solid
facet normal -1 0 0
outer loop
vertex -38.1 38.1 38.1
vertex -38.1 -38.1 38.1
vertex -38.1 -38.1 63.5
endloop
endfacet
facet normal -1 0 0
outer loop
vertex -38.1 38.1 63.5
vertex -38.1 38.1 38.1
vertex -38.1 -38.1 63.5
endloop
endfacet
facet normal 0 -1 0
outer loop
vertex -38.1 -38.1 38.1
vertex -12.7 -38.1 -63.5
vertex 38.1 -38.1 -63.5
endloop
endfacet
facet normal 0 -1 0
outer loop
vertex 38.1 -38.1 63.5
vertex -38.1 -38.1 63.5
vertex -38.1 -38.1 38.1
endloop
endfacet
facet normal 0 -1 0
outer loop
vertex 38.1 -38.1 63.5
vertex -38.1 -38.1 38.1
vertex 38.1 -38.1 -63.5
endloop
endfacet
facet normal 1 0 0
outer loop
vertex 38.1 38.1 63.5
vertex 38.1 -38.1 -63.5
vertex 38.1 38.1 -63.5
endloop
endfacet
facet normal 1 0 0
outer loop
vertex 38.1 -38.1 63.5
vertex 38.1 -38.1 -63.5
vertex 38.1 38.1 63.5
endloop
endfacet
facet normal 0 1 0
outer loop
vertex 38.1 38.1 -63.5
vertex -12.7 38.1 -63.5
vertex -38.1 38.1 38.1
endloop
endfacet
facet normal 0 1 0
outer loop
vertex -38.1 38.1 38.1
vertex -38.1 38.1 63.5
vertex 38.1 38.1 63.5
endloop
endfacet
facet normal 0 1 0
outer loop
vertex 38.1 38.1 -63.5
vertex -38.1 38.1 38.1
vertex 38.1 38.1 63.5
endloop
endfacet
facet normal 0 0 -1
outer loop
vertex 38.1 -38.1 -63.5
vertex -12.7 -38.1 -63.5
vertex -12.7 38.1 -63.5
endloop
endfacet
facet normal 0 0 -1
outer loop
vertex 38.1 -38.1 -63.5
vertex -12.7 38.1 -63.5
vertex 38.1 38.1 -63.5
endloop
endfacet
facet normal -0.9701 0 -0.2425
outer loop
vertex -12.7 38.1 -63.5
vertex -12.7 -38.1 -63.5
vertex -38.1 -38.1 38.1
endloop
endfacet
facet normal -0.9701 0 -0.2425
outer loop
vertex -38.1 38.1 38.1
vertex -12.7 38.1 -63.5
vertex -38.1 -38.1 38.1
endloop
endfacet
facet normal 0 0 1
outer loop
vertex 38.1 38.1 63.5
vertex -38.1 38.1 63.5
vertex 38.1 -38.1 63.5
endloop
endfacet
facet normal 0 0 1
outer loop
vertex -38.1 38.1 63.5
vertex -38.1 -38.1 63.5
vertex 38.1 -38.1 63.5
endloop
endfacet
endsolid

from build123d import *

# Parameters (mm, degrees)
F0_W     = 76.2
F0_H     = 127
F1_DEPTH = 38.1
F3_DEPTH = 76.201


with BuildPart() as f1:
    # F0 (on Front) → F1 (new body, symmetric)
    with BuildSketch(Plane.XZ):
        Rectangle(F0_W, F0_H)
    extrude(amount=F1_DEPTH, both=True)

    # F2 (on face) → F3 (cut, through all)
    with BuildSketch(Plane.XZ.offset(38.1)):
        Polygon((-38.1, 38.1), (-38.1, -63.5), (-12.7, -63.5), align=None)
    extrude(amount=-F3_DEPTH, mode=Mode.SUBTRACT)


solid = f1.part
